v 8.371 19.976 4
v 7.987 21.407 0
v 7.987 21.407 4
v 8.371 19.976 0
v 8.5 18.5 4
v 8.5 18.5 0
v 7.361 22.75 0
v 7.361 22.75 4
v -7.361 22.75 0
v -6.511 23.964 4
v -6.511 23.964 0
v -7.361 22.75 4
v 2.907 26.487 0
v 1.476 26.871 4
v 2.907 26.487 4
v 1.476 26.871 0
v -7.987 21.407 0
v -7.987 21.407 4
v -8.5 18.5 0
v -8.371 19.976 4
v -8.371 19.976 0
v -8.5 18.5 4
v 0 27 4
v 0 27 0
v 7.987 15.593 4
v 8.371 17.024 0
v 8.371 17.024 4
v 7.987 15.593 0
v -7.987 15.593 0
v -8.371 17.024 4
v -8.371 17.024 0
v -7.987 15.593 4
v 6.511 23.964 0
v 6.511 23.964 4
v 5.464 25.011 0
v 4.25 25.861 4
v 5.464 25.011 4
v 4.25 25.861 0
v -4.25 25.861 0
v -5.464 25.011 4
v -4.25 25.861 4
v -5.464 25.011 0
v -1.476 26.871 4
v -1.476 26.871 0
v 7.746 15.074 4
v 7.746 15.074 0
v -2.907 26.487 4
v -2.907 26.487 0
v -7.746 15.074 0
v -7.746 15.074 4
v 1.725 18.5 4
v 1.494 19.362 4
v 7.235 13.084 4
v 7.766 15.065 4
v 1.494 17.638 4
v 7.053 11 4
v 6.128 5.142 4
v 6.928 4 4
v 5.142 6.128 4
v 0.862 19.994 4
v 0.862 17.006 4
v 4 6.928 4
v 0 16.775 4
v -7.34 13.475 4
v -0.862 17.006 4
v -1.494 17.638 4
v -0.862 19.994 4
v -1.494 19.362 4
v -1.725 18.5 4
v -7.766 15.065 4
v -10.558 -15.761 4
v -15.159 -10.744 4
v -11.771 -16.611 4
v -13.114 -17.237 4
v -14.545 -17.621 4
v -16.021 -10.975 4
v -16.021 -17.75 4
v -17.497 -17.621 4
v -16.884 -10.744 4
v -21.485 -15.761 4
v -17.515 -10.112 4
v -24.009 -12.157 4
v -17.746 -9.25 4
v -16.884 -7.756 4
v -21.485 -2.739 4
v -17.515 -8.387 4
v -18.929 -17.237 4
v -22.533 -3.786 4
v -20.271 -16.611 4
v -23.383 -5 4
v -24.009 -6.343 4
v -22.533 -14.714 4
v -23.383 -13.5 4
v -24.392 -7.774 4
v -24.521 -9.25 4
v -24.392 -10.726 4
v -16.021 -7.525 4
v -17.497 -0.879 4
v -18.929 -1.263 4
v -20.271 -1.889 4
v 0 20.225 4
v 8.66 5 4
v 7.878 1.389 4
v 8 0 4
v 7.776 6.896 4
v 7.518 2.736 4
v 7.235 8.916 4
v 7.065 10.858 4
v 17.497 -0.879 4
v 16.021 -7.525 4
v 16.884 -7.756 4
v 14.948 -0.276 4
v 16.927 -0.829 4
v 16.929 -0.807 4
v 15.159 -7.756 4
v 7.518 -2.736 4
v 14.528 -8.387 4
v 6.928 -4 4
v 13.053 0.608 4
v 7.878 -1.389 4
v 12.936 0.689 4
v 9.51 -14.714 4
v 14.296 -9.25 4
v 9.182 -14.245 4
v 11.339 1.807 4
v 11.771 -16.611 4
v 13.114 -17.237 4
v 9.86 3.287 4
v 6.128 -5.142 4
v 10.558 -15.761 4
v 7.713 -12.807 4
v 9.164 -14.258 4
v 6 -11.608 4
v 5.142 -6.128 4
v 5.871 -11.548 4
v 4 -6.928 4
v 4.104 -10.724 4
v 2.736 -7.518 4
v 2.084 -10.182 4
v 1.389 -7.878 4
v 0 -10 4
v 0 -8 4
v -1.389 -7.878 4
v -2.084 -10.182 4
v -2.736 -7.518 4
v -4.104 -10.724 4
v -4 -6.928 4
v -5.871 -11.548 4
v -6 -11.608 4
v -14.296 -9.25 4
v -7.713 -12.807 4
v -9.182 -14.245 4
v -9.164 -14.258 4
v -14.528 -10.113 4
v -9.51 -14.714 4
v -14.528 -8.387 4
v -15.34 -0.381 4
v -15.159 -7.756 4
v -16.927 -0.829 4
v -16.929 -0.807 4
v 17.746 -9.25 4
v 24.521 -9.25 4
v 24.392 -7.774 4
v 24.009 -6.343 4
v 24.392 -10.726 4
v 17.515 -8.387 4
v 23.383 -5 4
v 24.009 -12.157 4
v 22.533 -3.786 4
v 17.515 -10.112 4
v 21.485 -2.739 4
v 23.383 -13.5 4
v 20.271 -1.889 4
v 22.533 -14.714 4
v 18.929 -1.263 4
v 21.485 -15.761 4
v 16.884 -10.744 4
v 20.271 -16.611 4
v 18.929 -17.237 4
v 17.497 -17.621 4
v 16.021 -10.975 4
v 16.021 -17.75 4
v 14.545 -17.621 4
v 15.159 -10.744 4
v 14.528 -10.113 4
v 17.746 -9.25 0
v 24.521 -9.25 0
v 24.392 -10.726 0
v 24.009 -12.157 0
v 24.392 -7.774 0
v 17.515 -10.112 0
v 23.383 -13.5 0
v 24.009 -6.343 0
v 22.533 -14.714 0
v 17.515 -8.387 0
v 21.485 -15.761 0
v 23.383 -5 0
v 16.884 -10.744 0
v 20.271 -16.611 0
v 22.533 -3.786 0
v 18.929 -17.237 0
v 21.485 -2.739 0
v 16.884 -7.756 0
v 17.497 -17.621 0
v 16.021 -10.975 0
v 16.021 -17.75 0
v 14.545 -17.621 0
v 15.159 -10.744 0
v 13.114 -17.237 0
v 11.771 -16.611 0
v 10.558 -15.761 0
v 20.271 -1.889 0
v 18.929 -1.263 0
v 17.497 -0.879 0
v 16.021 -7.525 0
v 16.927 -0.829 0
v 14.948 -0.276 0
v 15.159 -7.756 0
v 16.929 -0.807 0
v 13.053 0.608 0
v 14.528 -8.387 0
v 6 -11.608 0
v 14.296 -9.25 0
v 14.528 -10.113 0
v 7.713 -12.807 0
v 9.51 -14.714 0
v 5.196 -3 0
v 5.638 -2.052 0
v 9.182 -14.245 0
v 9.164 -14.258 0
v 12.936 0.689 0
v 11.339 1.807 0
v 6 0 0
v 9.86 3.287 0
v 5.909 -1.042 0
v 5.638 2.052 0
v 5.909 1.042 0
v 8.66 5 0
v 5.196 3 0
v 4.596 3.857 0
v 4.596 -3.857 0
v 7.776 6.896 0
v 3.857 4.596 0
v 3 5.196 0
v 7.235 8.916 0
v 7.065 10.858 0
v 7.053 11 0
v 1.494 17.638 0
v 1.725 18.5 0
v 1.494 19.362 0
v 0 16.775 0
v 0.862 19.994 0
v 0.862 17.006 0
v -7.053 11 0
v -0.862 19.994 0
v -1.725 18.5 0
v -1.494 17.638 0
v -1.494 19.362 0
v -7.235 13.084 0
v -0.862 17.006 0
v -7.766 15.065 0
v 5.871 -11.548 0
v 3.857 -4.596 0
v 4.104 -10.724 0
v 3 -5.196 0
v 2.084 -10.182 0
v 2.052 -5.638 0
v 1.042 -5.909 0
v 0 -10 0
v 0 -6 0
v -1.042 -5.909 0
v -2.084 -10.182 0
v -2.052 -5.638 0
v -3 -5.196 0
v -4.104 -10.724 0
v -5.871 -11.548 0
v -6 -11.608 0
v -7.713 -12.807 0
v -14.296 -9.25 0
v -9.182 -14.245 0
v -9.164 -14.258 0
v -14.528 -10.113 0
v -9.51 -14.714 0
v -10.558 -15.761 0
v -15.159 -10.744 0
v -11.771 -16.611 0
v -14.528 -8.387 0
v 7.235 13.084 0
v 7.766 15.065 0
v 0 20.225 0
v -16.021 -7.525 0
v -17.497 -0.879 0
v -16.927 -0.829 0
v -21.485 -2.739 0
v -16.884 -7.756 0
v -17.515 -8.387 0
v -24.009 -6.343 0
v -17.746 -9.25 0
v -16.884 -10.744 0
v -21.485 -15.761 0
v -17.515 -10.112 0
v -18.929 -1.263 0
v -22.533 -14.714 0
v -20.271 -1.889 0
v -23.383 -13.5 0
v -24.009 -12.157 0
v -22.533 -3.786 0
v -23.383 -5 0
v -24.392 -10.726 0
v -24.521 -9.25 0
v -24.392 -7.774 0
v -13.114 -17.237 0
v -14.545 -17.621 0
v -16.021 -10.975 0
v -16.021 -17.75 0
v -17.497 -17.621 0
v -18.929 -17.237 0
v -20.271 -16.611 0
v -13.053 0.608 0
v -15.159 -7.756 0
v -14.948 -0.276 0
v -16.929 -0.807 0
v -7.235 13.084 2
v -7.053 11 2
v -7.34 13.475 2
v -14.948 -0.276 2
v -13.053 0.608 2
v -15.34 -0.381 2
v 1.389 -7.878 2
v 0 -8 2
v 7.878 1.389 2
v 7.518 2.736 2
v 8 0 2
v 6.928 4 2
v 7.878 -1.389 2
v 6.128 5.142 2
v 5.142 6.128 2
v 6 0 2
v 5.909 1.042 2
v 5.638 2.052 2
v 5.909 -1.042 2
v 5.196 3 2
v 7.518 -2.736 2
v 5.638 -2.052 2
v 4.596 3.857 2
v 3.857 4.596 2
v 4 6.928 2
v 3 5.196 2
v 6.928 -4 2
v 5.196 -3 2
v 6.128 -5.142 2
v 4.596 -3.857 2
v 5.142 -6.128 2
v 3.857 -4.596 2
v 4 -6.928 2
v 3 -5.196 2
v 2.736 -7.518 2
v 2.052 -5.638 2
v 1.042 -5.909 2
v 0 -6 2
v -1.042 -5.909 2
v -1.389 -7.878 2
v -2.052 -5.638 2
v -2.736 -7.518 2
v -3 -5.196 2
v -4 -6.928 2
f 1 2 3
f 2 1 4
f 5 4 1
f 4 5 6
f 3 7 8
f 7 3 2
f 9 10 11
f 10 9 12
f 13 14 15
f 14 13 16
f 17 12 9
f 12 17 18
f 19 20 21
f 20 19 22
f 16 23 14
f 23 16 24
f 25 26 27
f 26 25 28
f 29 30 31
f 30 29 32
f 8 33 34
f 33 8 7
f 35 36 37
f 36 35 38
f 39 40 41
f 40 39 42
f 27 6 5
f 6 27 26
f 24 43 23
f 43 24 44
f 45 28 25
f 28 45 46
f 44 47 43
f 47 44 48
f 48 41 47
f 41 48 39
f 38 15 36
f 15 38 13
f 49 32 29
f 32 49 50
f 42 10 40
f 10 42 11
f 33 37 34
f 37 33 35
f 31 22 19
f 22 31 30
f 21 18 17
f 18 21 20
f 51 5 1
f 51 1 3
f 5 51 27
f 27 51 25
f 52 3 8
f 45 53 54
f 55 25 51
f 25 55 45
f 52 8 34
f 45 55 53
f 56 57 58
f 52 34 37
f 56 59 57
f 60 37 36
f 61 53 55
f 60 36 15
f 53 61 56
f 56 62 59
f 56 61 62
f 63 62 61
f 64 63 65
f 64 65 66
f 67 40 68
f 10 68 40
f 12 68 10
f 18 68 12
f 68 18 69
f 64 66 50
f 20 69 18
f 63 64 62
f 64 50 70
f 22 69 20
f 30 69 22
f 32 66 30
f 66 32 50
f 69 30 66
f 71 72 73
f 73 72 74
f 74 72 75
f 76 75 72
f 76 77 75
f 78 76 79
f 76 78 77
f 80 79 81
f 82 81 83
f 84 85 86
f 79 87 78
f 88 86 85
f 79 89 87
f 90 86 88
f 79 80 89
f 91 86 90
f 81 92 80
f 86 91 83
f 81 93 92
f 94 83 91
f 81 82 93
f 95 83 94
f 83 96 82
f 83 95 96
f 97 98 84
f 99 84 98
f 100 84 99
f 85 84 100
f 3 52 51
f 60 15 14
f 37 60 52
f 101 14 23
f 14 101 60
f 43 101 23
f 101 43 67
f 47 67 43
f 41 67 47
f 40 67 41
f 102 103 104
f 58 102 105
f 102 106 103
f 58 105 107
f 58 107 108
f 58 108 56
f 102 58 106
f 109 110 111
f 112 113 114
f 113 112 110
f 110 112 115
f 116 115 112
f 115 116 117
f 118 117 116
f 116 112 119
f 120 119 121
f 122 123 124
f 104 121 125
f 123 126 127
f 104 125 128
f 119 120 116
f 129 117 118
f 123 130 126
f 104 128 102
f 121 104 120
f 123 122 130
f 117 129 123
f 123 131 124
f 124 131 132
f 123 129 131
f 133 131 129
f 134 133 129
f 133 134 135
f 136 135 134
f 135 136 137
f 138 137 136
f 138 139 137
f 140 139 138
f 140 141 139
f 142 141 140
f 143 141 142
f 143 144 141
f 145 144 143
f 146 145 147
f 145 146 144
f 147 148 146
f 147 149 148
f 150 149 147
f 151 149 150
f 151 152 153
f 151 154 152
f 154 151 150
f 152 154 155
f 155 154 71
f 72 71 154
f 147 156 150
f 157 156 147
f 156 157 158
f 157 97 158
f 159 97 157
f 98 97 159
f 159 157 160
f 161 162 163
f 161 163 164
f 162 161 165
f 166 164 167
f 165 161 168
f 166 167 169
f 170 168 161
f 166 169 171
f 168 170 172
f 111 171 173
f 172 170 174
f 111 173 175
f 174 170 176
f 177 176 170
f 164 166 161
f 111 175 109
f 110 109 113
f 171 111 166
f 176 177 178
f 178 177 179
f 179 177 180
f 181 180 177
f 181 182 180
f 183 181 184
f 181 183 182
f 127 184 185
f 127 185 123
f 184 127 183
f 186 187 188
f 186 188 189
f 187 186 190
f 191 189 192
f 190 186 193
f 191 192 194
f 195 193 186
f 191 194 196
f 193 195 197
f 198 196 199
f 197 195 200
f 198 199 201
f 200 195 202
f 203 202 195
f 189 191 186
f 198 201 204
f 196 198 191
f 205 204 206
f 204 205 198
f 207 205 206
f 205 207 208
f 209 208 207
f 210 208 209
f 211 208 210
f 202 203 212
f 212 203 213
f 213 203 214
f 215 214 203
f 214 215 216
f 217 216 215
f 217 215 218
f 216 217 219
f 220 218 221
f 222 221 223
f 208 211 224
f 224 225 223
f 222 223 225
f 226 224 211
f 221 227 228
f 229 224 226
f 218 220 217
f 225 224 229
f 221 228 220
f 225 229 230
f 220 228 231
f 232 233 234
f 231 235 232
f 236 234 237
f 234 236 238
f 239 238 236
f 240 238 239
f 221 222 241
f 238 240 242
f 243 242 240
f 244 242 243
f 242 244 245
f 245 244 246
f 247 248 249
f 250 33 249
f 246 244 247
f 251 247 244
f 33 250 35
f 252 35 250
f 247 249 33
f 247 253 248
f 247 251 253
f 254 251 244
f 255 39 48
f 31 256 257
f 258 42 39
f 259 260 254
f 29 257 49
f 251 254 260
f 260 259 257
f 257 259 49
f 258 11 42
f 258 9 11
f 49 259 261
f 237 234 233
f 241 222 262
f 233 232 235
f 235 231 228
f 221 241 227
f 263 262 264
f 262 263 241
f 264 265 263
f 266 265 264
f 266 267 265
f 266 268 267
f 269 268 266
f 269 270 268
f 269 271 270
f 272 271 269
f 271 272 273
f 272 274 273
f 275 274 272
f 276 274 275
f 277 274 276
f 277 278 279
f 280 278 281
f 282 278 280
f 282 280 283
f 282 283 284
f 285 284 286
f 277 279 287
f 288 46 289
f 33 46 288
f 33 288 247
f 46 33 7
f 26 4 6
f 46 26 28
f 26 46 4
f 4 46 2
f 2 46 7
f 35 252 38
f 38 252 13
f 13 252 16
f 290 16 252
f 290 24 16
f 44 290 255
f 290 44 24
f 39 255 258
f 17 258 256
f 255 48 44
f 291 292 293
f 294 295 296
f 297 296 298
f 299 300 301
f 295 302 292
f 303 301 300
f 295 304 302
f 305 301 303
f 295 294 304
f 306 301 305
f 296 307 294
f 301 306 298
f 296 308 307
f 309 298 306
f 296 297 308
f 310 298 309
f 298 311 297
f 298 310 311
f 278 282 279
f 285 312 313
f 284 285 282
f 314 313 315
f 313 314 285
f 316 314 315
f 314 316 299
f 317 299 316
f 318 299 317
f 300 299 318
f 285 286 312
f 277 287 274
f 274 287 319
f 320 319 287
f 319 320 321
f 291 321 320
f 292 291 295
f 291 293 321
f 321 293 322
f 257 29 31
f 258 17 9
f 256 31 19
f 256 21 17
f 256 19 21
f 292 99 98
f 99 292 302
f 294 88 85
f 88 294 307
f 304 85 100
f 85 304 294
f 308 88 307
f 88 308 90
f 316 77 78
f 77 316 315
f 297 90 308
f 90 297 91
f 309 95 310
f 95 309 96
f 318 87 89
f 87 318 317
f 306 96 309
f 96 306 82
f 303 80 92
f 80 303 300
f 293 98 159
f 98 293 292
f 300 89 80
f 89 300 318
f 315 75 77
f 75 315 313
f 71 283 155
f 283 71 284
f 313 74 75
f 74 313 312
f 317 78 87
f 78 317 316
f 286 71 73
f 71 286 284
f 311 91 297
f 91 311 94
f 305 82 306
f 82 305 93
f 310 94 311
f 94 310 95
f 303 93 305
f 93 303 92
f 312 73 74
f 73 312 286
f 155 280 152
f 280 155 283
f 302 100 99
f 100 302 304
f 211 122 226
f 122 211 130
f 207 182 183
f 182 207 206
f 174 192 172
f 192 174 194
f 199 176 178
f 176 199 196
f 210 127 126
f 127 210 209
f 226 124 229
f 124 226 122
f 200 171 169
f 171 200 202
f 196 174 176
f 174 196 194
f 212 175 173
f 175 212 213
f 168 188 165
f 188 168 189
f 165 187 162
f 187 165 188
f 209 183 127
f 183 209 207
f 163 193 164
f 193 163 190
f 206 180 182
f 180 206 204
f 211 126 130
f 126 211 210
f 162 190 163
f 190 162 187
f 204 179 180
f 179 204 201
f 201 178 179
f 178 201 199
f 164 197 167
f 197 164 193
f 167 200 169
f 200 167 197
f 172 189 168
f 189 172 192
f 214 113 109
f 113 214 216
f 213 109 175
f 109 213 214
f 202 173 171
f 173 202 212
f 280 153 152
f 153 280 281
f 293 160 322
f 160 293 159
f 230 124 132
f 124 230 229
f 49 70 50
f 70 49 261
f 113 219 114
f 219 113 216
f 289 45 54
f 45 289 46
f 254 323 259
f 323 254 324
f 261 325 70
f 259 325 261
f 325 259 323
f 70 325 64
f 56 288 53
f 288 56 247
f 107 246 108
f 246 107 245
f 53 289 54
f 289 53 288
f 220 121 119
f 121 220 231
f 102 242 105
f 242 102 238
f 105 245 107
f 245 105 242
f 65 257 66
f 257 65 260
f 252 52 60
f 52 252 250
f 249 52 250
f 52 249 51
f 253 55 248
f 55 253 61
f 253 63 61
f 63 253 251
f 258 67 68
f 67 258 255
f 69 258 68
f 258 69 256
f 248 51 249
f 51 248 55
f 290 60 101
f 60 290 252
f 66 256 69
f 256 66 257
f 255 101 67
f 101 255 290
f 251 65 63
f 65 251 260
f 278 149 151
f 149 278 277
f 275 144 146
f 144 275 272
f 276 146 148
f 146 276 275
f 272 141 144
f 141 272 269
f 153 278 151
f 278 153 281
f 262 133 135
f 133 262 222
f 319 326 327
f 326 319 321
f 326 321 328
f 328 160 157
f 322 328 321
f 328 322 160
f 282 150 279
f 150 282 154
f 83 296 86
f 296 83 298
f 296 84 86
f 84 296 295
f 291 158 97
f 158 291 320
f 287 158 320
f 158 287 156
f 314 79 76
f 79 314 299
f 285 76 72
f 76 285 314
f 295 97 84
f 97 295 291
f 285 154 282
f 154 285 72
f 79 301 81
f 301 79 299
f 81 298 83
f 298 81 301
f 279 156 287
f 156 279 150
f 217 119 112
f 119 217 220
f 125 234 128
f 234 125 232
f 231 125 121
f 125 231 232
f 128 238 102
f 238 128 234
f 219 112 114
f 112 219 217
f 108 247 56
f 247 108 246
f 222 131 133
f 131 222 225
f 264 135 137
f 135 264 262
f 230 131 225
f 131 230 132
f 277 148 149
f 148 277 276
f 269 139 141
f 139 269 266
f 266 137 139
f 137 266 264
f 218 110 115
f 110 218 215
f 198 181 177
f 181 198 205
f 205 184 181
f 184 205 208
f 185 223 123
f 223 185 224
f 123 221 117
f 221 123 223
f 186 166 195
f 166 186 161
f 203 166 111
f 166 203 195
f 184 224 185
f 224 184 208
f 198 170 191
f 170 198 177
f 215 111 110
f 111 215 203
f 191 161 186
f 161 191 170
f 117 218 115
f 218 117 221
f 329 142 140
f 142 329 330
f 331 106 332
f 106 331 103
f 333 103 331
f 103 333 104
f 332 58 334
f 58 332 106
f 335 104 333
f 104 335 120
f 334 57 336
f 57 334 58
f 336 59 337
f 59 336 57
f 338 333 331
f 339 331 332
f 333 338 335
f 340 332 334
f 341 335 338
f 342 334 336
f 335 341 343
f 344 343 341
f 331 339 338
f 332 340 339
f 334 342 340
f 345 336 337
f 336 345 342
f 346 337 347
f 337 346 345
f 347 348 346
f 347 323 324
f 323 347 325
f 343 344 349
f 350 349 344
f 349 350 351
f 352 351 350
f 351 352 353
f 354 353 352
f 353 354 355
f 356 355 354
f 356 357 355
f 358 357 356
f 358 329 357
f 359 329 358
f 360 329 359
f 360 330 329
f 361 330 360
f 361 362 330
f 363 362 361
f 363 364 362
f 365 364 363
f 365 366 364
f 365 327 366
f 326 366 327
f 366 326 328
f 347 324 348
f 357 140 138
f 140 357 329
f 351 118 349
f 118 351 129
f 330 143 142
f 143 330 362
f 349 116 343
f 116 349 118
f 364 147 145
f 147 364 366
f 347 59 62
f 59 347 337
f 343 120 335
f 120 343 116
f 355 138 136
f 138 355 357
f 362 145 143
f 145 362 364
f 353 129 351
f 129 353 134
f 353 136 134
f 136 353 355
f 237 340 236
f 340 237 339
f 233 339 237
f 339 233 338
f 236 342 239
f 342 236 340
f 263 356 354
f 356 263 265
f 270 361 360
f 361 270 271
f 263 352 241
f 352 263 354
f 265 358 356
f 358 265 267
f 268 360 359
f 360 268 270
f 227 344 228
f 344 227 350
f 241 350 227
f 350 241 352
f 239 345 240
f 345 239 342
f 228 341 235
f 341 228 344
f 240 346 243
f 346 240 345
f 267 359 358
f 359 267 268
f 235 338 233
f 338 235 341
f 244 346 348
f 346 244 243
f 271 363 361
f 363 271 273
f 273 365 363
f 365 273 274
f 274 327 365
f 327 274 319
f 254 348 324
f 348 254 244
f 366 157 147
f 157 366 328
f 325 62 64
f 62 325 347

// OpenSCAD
// file: configuration.scad
// Increase this if your slicer or printer make holes too tight.
extra_radius = 0.1;

// OD = outside diameter, corner to corner.
m3_nut_od = 6.1;
m3_nut_radius = m3_nut_od/2 + 0.2 + extra_radius;

// Major diameter of metric 3mm thread.
m3_major = 2.85;
m3_radius = m3_major/2 + extra_radius;
m3_wide_radius = m3_major/2 + extra_radius + 0.2;

// NEMA17 stepper motors.
motor_shaft_diameter = 5;
motor_shaft_radius = motor_shaft_diameter/2 + extra_radius;

// Frame brackets. M3x8mm screws work best with 3.6 mm brackets.
thickness = 3.6;

// OpenBeam or Misumi. Currently only 15x15 mm, but there is a plan
// to make models more parametric and allow 20x20 mm in the future.
extrusion = 15;
// main file
include <configuration.scad>;

separation = 44;  // Distance between ball joint mounting faces.
offset = 22;  // Same as DELTA_EFFECTOR_OFFSET in Marlin.
mount_radius = 18.5;  // Hotend mounting screws, standard would be 25mm.

// Tuning Parameters for Different Jheads -- Edit Here
jhead_od_radius = 8;  // Hole for the hotend (J-Head diameter is 16mm).
jhead_id_radius = 6;
jhead_upper_height = 2; // From top of hotend to notch
jhead_notch_height = 2; // Notch height
// End Edit

height = jhead_upper_height + jhead_notch_height;


module body_base() {
  union() {
		cylinder(r=offset-5, h=height, center=true, $fn=36);
		
		for (a = [0:120:359]) rotate([0, 0, a]) {
      	translate([0, mount_radius, 0])	cylinder(r=8.5, h=height, center=true, $fn=36);
    		}
		   
    }
}

module body_cuts() {
   union() {
     for (a = [0:120:359]) rotate([0, 0, a]) {
      translate([0, mount_radius, 0])	cylinder(r=m3_wide_radius, h=height, center=true, $fn=12);
     for (a = [60:120:359]) rotate([0, 0, a]) {
       translate([0, offset, height/2])	cylinder(r=12, h=height*2, center=true, $fn=36);
       }
    }
   }

}

module body()
{
    difference(){
          body_base();
          body_cuts();
          }

}

module hotend_cutouts() 
{

	
	translate([0, 0, 0])cylinder(r=jhead_od_radius, h=jhead_upper_height, $fn=36);
    translate([0, 0,-1 * jhead_upper_height]) cylinder(r=jhead_id_radius, h=height, $fn=36); 
    

	rotate([0, 0, 60])translate([0,offset/2,0])cube ([jhead_id_radius*2,offset,height*2],center=true);
	rotate([0, 0, 60])translate([0,offset/2,jhead_notch_height+2])cube ([jhead_od_radius*2,offset,height*2],center=true);


   


}
module mount() {
  difference() {
     body();
     hotend_cutouts();
  }
}

translate([0, 0, height/2]) mount();
